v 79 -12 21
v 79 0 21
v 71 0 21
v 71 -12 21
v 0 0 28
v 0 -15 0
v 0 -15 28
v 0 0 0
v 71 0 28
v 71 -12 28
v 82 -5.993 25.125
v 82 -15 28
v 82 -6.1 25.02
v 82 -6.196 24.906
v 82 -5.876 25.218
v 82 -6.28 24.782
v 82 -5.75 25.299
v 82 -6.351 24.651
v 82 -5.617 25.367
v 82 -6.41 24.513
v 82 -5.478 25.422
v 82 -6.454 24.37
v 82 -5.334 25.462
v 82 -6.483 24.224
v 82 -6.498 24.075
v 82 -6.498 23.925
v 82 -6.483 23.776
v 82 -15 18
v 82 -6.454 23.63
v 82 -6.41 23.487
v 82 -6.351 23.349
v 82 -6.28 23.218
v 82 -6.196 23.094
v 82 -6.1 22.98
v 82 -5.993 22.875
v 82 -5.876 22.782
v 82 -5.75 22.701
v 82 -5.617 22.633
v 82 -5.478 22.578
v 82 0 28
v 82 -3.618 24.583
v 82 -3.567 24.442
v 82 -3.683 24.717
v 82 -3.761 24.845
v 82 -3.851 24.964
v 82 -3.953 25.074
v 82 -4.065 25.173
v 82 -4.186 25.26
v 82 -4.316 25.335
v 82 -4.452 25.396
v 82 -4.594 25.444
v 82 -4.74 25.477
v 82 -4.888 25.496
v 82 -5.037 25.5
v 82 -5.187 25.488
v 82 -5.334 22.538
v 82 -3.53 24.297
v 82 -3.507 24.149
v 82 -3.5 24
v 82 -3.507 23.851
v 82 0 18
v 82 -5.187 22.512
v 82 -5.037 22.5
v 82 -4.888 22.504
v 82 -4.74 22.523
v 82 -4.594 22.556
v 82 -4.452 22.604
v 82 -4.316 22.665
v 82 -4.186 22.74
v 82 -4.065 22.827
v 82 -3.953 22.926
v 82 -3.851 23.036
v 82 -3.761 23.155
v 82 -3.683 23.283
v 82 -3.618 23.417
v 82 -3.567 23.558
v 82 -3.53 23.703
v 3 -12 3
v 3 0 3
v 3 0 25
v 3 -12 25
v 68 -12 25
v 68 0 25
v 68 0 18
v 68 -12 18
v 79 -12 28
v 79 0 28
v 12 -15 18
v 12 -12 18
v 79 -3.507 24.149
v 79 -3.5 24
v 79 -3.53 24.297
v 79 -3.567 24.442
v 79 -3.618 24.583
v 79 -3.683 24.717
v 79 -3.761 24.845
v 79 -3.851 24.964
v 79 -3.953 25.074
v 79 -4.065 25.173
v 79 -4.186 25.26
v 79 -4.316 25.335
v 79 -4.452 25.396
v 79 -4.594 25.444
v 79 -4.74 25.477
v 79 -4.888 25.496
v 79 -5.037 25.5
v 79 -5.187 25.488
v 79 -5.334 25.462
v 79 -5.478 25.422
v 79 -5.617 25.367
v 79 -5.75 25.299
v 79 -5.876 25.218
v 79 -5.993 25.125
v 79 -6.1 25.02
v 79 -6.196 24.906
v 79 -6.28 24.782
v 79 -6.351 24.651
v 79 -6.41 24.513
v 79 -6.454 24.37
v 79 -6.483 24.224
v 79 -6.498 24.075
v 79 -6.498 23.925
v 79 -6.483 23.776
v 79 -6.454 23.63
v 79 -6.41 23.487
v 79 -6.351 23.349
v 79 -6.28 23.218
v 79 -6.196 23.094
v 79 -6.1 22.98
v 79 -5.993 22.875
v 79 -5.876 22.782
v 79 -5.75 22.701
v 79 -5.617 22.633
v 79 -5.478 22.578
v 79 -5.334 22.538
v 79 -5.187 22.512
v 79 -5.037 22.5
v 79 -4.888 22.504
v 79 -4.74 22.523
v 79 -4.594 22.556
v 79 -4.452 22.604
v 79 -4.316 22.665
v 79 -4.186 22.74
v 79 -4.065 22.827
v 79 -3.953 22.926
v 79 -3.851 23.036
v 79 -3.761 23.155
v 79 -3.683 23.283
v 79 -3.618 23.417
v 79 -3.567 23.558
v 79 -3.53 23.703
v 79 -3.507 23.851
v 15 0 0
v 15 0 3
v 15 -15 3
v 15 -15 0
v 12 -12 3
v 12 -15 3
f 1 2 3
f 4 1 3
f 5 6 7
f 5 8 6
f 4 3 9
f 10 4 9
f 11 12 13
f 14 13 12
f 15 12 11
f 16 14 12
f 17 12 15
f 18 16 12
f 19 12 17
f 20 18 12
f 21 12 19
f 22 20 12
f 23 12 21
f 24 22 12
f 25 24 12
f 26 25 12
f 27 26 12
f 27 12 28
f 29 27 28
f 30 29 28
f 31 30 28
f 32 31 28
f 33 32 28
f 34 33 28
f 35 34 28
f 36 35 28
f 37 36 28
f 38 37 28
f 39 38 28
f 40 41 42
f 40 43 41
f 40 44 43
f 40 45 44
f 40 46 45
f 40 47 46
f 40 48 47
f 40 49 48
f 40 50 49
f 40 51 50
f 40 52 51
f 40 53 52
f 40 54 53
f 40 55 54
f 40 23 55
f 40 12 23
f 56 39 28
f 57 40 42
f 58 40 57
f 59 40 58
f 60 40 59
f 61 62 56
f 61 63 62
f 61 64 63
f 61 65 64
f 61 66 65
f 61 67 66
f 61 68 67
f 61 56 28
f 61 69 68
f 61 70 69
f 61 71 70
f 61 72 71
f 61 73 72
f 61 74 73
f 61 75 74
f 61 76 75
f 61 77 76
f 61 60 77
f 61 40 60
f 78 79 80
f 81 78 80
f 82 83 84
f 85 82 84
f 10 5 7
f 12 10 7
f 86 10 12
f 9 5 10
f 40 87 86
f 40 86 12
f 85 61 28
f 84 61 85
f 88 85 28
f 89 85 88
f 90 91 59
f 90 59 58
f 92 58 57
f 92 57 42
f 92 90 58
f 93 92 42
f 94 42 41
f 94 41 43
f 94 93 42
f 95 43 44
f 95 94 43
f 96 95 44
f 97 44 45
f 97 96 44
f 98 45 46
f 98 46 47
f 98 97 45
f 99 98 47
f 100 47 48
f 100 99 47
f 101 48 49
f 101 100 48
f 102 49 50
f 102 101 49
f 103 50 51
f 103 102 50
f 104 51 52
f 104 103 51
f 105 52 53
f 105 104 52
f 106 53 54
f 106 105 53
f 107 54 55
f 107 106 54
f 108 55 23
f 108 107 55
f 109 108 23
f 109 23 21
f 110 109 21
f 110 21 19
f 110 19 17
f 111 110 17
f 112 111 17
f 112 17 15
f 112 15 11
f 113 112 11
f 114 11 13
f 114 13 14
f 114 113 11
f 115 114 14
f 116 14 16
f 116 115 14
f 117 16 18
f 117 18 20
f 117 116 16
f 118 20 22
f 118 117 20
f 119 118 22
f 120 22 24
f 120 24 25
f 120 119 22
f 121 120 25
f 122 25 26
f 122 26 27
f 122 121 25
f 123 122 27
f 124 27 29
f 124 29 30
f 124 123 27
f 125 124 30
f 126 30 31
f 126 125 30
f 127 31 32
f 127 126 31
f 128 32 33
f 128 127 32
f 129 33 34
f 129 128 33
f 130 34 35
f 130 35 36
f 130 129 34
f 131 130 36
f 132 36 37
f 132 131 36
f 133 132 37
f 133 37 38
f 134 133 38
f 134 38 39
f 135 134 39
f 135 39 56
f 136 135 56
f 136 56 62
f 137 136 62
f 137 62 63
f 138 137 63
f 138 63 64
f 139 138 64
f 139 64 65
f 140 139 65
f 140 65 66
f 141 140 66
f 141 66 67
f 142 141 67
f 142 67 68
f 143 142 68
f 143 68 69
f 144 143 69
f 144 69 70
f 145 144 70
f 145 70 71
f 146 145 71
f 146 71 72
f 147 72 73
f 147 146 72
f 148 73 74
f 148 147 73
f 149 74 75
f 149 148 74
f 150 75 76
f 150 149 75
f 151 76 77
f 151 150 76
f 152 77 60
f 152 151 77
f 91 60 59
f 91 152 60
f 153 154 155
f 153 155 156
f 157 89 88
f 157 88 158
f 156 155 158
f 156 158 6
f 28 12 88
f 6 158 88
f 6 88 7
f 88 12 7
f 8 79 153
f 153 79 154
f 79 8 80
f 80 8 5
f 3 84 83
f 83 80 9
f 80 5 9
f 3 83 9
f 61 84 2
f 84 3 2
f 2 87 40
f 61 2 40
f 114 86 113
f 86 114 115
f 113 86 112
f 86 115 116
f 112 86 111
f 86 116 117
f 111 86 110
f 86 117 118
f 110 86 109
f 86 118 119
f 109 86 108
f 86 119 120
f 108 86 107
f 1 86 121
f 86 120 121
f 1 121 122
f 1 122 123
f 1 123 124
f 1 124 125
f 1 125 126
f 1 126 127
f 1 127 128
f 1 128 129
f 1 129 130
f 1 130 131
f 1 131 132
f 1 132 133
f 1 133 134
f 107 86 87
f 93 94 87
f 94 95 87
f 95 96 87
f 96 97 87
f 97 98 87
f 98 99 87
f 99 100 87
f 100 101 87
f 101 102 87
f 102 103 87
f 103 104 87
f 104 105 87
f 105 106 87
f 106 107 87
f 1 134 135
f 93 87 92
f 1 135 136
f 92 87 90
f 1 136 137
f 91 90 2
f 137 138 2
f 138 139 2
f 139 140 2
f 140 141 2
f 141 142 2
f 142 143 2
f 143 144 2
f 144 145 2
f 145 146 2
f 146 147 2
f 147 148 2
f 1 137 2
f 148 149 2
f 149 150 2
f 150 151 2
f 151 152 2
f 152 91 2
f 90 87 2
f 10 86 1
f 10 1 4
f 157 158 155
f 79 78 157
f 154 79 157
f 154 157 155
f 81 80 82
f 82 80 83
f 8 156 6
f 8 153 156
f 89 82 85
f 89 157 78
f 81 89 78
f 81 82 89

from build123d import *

# Parameters (mm, degrees)
PAD_DEPTH      = 12
PAD001_DEPTH   = 3
CYLINDER_R     = 1.5
CYLINDER_DEPTH = 3


with BuildPart() as part:
    # Sketch → Pad (new body)
    with BuildSketch(Plane.XZ):
        Polygon((82, 18), (82, 28), (79, 28), (79, 21), (71, 21), (71, 28), (0, 28), (0, 0), (15, 0), (15, 3), (3, 3), (3, 25), (68, 25), (68, 18), align=None)
    extrude(amount=PAD_DEPTH)

    # Sketch001 → Pad001 (join)
    with BuildSketch(Plane.XZ.offset(12)):
        Polygon((0, 28), (82, 28), (82, 18), (12, 18), (12, 3), (15, 3), (15, 0), (0, 0), align=None)
    extrude(amount=PAD001_DEPTH)

    # Cylinder → Cylinder (cut)
    with BuildSketch(Plane(origin=(79, -5, 24), x_dir=(0, 1, 0), z_dir=(1, 0, 0))):
        Circle(CYLINDER_R)
    extrude(amount=CYLINDER_DEPTH, mode=Mode.SUBTRACT)


solid = part.part
